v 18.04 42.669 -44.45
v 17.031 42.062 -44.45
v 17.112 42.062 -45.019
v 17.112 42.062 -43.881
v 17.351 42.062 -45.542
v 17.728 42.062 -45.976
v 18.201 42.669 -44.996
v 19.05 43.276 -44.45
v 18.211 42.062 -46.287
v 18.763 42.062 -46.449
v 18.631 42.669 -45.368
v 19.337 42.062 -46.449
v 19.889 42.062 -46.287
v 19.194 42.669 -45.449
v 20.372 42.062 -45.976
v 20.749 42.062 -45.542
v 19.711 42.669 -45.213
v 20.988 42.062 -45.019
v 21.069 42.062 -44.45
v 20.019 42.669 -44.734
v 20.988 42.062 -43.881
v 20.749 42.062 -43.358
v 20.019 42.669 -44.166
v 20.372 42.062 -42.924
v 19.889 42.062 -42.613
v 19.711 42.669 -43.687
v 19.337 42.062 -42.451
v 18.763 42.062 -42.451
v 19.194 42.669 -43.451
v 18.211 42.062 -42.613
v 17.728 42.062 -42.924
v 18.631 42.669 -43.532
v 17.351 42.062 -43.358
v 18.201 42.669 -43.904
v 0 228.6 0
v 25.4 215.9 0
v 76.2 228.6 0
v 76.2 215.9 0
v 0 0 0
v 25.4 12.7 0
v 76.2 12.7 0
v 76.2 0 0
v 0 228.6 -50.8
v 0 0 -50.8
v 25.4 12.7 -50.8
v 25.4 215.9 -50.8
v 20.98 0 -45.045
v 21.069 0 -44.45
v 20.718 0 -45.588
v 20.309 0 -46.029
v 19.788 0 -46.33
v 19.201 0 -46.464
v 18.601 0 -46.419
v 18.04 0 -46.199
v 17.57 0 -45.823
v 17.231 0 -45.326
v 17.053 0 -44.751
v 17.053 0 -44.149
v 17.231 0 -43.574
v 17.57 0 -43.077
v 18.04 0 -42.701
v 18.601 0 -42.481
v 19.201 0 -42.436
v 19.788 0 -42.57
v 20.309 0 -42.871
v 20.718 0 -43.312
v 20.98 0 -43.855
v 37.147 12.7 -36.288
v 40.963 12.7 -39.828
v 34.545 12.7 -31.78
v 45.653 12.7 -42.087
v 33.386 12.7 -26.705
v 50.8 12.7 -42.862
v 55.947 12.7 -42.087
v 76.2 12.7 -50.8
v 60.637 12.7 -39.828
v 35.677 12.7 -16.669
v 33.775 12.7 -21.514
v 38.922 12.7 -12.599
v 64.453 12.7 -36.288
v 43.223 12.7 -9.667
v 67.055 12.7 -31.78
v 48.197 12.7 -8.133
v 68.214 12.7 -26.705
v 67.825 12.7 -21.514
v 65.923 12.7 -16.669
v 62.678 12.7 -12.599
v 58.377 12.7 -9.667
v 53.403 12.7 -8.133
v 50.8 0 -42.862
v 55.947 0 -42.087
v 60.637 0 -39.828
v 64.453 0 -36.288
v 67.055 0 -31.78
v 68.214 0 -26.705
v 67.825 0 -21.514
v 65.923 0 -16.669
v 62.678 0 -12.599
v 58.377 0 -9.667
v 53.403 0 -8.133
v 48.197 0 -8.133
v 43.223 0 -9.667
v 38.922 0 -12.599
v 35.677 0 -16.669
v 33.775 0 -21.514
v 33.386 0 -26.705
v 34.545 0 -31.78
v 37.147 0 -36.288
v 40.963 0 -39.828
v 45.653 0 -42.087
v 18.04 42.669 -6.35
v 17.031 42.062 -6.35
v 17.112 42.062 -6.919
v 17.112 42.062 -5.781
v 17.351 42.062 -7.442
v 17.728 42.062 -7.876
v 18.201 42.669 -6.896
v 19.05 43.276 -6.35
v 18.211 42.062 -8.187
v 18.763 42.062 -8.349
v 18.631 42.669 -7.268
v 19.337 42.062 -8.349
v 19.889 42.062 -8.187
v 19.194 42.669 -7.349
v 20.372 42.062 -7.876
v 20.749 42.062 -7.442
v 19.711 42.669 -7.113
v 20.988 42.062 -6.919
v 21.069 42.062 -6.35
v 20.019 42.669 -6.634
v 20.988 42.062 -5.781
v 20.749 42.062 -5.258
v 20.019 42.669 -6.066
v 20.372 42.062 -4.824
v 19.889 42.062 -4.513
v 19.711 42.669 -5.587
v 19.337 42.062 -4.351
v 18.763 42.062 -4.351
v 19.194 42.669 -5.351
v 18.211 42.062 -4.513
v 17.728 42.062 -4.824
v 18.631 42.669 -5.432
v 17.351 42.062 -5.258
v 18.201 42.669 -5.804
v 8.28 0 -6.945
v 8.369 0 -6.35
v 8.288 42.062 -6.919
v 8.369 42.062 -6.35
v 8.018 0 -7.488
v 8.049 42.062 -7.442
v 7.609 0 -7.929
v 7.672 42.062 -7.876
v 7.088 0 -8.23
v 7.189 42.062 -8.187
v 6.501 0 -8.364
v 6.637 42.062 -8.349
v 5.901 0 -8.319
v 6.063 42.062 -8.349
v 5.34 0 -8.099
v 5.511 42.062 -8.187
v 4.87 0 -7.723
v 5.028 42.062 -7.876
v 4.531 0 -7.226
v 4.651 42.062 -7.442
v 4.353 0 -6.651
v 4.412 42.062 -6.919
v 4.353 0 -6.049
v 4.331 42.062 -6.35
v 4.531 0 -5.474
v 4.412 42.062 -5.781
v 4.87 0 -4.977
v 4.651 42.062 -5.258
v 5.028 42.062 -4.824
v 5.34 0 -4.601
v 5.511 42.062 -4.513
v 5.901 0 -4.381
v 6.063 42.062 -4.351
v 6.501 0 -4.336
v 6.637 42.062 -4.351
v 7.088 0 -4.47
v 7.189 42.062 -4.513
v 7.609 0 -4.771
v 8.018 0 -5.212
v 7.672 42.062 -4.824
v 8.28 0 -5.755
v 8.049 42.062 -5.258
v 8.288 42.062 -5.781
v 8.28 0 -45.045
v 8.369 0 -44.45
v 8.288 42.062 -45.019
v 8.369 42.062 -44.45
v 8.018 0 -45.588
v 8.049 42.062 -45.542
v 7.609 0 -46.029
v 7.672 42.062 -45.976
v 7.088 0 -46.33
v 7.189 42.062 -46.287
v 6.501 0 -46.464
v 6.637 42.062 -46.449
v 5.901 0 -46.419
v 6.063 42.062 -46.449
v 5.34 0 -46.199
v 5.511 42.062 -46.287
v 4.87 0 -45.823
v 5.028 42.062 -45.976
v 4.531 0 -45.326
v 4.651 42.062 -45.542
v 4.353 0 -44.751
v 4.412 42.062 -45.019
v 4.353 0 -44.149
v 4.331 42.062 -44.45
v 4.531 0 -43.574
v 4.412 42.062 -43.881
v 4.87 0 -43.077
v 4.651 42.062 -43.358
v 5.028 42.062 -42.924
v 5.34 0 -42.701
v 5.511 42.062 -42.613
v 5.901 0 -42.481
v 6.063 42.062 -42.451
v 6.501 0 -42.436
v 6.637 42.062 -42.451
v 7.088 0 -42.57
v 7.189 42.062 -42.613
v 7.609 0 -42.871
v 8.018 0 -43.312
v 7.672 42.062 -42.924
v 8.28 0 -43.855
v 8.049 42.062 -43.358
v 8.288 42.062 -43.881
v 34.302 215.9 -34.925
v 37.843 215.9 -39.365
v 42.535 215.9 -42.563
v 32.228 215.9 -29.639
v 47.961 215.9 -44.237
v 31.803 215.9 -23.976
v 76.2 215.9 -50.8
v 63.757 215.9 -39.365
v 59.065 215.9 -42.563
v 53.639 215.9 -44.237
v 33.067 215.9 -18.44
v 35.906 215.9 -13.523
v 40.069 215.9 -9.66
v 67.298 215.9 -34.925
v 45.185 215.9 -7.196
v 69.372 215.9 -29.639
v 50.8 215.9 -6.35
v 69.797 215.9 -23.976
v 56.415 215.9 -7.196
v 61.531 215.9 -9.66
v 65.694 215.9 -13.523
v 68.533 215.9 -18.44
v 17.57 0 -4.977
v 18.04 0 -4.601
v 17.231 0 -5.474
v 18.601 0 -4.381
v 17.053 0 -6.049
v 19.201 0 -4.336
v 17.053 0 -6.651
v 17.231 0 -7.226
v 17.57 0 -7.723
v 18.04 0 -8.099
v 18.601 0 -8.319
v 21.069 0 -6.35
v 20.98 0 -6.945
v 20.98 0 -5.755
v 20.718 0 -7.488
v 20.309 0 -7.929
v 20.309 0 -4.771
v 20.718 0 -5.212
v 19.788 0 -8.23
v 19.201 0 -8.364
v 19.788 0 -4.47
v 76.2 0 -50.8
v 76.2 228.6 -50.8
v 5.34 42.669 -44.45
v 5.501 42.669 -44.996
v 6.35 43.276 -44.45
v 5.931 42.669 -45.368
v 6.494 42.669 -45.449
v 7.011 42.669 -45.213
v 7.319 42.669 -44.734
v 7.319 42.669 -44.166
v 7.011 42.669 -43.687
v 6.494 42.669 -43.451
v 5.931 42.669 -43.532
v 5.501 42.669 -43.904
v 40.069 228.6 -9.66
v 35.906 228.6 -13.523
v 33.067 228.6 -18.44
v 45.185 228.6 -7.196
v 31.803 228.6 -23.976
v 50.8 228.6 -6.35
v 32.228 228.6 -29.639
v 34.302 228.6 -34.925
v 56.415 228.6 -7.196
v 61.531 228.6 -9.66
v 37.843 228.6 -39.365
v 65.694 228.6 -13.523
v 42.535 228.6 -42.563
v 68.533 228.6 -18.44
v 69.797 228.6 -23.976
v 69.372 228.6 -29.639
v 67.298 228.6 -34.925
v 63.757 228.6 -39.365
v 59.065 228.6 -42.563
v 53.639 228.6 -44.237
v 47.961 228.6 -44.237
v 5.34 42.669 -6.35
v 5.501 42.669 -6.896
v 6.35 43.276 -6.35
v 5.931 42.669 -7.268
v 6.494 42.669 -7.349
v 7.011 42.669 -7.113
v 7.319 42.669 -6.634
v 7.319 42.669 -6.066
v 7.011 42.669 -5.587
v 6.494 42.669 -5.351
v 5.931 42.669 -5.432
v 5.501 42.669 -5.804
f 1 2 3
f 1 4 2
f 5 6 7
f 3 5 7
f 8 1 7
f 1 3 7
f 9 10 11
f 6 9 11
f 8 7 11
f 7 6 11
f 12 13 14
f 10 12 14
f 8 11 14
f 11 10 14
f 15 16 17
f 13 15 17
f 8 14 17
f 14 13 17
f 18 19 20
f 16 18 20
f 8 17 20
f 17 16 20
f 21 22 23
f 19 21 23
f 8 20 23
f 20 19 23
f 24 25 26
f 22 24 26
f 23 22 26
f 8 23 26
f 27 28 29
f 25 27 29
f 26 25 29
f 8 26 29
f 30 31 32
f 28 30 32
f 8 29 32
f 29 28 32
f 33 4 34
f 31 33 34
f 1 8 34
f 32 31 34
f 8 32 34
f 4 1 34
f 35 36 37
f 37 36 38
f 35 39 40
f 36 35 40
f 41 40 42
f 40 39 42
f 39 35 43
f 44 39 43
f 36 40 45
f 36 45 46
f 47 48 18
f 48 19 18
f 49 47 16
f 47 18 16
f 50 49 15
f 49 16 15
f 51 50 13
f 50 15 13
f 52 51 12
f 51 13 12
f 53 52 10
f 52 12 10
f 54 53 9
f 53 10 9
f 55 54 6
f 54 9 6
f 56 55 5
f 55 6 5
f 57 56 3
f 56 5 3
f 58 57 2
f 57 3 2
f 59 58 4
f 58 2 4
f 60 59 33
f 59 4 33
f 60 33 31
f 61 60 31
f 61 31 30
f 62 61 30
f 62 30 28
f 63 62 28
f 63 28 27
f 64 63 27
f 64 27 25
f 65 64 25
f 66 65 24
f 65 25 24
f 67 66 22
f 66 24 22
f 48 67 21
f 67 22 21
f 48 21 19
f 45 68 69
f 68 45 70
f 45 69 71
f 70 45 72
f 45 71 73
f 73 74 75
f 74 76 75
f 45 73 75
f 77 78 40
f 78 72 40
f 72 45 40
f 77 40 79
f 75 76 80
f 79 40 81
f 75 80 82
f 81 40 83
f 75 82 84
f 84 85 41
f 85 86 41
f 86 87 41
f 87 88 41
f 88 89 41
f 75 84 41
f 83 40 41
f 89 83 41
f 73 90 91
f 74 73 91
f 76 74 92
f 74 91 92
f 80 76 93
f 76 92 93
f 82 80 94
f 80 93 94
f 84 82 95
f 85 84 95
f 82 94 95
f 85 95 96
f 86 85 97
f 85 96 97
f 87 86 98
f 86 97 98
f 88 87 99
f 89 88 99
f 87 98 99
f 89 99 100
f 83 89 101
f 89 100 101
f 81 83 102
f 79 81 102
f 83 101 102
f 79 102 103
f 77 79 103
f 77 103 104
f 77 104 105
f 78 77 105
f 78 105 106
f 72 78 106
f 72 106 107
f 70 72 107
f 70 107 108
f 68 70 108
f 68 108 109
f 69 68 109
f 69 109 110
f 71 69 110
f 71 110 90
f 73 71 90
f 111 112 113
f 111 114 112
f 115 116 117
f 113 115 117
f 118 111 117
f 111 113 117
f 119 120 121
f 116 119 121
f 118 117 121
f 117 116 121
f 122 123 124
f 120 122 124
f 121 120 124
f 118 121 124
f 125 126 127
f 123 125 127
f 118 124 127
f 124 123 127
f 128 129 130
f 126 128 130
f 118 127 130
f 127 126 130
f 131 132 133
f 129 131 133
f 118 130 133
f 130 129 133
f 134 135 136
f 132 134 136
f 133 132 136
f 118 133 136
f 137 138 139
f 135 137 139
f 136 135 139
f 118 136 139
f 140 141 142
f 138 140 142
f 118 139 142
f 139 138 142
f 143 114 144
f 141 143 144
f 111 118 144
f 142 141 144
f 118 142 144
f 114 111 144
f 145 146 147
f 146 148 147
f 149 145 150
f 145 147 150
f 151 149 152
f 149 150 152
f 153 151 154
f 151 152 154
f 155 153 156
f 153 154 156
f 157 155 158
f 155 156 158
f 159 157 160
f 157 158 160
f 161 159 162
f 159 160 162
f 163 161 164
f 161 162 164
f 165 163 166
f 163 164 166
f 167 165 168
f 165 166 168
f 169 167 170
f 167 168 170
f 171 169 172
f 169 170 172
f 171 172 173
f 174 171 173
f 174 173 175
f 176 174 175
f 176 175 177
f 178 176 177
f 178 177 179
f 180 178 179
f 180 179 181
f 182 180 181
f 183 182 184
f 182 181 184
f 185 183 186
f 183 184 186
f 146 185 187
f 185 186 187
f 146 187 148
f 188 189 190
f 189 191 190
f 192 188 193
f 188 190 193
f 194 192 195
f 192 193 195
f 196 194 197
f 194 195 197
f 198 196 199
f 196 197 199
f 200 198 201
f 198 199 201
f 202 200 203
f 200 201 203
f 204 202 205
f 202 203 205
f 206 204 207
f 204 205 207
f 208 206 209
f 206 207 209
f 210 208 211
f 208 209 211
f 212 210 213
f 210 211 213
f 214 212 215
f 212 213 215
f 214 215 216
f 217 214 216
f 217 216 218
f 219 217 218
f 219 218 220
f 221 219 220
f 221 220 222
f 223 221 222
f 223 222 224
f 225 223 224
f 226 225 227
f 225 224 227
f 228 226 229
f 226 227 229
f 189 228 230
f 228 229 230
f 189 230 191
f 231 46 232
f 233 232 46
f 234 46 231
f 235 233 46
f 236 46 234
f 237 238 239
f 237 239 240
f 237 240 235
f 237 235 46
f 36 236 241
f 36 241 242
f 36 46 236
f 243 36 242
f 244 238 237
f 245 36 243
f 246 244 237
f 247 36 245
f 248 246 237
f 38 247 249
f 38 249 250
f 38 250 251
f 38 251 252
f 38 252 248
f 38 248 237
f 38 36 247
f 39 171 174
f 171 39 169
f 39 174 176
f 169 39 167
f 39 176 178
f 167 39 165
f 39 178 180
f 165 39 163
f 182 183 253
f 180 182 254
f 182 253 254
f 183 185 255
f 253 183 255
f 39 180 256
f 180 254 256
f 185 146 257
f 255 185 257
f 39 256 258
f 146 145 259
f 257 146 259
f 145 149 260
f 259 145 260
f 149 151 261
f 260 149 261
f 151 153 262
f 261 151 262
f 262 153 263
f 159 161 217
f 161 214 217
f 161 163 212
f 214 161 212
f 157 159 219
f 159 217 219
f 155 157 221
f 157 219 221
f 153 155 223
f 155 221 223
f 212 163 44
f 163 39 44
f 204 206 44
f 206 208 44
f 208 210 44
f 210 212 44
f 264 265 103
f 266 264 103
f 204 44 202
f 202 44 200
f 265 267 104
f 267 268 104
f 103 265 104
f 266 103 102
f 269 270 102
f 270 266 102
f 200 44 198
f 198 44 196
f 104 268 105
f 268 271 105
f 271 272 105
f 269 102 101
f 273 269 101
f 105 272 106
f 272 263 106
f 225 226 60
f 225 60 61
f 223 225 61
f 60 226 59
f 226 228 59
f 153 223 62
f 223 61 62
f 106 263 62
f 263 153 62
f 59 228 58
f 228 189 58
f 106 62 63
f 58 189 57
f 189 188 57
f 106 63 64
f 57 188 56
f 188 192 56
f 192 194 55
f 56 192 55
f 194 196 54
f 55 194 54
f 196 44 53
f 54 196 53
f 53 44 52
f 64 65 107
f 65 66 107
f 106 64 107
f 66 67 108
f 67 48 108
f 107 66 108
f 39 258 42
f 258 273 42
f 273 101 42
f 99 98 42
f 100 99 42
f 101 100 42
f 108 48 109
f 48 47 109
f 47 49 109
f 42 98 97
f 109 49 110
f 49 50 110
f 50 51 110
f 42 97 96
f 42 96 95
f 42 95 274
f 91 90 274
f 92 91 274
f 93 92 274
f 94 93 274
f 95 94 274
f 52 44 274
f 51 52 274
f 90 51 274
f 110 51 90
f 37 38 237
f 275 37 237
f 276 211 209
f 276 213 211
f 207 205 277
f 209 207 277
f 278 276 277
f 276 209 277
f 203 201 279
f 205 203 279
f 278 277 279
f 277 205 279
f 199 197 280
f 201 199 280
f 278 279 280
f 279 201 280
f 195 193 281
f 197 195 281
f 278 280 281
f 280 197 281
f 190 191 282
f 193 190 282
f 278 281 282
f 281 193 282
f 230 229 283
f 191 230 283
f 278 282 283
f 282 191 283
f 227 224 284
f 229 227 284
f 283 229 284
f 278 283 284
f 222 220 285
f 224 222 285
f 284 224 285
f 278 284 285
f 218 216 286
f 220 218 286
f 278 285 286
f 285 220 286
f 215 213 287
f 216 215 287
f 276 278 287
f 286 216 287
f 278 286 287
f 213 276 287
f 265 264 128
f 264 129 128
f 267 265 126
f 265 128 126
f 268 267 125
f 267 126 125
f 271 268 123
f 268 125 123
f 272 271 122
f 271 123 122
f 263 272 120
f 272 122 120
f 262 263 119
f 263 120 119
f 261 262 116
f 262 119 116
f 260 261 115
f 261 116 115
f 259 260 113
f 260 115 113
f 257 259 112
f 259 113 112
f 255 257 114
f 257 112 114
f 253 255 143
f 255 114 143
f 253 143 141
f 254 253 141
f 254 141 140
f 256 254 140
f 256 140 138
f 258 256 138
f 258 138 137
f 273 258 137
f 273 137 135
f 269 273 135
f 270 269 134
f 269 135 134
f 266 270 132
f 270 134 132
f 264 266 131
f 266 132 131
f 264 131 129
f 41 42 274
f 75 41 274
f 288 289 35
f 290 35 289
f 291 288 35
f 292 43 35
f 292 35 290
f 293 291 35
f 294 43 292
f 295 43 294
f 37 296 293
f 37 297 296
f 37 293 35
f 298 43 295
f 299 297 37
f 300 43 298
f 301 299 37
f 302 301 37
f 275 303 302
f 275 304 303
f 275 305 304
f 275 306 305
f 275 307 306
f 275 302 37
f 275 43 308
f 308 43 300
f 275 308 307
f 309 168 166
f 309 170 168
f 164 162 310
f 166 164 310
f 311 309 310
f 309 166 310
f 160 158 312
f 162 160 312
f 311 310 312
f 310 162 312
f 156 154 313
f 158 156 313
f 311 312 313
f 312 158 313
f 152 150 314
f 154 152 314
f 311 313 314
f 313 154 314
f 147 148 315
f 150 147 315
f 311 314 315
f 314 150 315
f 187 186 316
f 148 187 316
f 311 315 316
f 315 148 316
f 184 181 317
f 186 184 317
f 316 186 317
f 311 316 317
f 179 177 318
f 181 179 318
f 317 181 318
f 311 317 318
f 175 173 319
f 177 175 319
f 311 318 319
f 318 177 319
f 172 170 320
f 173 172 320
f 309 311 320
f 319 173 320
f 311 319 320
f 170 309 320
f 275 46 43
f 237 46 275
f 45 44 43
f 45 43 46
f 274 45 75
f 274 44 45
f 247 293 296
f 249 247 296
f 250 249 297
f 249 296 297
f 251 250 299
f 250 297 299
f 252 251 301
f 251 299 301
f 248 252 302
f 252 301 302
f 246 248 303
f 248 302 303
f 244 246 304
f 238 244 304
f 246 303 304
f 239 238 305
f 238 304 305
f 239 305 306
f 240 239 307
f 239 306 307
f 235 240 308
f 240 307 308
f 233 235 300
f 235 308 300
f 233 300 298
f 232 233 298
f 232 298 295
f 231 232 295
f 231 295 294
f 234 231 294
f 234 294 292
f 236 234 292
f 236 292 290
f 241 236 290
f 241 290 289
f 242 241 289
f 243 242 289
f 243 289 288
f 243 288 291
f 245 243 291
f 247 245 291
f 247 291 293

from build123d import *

# Parameters (mm, degrees)
SKETCH1_W                  = 76.2
SKETCH1_H                  = 50.8
BOSS_EXTRUDE1_DEPTH        = 228.6
SKETCH2_W                  = 50.8
SKETCH2_H                  = 203.2
CUT_EXTRUDE1_DEPTH         = 247.262136757
CUT_EXTRUDE2_REACH         = 248.262
SKETCH5_R                  = 19.05
CUT_EXTRUDE3_REACH         = 248.262
SKETCH8_R                  = 17.4625
F_10_32_TAPPED_HOLE1_D     = 4.0386
F_10_32_TAPPED_HOLE1_DEPTH = 42.0624
F_10_32_TAPPED_HOLE1_TIP   = 1.213317848


with BuildPart() as part:
    # Sketch1 → Boss-Extrude1 (new body)
    with BuildSketch(Plane(origin=(0, 0, 0), x_dir=(1, 0, 0), z_dir=(0, 1, 0))):
        with Locations((38.1, 25.4)):
            Rectangle(SKETCH1_W, SKETCH1_H)
    extrude(amount=BOSS_EXTRUDE1_DEPTH)

    # Sketch2 → Cut-Extrude1 (cut, through all)
    with BuildSketch(Plane.XY):
        with Locations((50.8, 114.3)):
            Rectangle(SKETCH2_W, SKETCH2_H)
    extrude(amount=-CUT_EXTRUDE1_DEPTH, mode=Mode.SUBTRACT)

    # Sketch5 → Cut-Extrude2 (cut, up to next)
    with BuildSketch(Plane(origin=(0, 228.6, 0), x_dir=(1, 0, 0), z_dir=(0, 1, 0)), mode=Mode.PRIVATE) as cut_extrude2_sk1:
        with Locations(Location((50.8, 25.4, 0), (0, 0, 270))):
            Circle(SKETCH5_R)
    cut_extrude2_tool1 = extrude(cut_extrude2_sk1.sketch, amount=-CUT_EXTRUDE2_REACH, mode=Mode.PRIVATE) & part.part
    add(cut_extrude2_tool1.solids().sort_by_distance((50.8, 228.6, -25.4))[0], mode=Mode.SUBTRACT)

    # Sketch8 → Cut-Extrude3 (cut, up to next)
    with BuildSketch(Plane.XZ, mode=Mode.PRIVATE) as cut_extrude3_sk1:
        with Locations(Location((50.8, -25.4, 0), (0, 0, 270))):
            Circle(SKETCH8_R)
    cut_extrude3_tool1 = extrude(cut_extrude3_sk1.sketch, amount=-CUT_EXTRUDE3_REACH, mode=Mode.PRIVATE) & part.part
    add(cut_extrude3_tool1.solids().sort_by_distance((50.8, 0, -25.4))[0], mode=Mode.SUBTRACT)

    # #10-32 Tapped Hole1
    with Locations(Plane(origin=(0, 0, 0), x_dir=(-1, 0, 0), z_dir=(0, -1, 0))):
        with Locations((-6.35, 44.45), (-19.05, 44.45), (-6.35, 6.35), (-19.05, 6.35)):
            Hole(F_10_32_TAPPED_HOLE1_D / 2, depth=F_10_32_TAPPED_HOLE1_DEPTH)
            with Locations((0, 0, -(F_10_32_TAPPED_HOLE1_DEPTH + F_10_32_TAPPED_HOLE1_TIP / 2))):  # 118° drill point
                Cone(0, F_10_32_TAPPED_HOLE1_D / 2, F_10_32_TAPPED_HOLE1_TIP, mode=Mode.SUBTRACT)


solid = part.part
